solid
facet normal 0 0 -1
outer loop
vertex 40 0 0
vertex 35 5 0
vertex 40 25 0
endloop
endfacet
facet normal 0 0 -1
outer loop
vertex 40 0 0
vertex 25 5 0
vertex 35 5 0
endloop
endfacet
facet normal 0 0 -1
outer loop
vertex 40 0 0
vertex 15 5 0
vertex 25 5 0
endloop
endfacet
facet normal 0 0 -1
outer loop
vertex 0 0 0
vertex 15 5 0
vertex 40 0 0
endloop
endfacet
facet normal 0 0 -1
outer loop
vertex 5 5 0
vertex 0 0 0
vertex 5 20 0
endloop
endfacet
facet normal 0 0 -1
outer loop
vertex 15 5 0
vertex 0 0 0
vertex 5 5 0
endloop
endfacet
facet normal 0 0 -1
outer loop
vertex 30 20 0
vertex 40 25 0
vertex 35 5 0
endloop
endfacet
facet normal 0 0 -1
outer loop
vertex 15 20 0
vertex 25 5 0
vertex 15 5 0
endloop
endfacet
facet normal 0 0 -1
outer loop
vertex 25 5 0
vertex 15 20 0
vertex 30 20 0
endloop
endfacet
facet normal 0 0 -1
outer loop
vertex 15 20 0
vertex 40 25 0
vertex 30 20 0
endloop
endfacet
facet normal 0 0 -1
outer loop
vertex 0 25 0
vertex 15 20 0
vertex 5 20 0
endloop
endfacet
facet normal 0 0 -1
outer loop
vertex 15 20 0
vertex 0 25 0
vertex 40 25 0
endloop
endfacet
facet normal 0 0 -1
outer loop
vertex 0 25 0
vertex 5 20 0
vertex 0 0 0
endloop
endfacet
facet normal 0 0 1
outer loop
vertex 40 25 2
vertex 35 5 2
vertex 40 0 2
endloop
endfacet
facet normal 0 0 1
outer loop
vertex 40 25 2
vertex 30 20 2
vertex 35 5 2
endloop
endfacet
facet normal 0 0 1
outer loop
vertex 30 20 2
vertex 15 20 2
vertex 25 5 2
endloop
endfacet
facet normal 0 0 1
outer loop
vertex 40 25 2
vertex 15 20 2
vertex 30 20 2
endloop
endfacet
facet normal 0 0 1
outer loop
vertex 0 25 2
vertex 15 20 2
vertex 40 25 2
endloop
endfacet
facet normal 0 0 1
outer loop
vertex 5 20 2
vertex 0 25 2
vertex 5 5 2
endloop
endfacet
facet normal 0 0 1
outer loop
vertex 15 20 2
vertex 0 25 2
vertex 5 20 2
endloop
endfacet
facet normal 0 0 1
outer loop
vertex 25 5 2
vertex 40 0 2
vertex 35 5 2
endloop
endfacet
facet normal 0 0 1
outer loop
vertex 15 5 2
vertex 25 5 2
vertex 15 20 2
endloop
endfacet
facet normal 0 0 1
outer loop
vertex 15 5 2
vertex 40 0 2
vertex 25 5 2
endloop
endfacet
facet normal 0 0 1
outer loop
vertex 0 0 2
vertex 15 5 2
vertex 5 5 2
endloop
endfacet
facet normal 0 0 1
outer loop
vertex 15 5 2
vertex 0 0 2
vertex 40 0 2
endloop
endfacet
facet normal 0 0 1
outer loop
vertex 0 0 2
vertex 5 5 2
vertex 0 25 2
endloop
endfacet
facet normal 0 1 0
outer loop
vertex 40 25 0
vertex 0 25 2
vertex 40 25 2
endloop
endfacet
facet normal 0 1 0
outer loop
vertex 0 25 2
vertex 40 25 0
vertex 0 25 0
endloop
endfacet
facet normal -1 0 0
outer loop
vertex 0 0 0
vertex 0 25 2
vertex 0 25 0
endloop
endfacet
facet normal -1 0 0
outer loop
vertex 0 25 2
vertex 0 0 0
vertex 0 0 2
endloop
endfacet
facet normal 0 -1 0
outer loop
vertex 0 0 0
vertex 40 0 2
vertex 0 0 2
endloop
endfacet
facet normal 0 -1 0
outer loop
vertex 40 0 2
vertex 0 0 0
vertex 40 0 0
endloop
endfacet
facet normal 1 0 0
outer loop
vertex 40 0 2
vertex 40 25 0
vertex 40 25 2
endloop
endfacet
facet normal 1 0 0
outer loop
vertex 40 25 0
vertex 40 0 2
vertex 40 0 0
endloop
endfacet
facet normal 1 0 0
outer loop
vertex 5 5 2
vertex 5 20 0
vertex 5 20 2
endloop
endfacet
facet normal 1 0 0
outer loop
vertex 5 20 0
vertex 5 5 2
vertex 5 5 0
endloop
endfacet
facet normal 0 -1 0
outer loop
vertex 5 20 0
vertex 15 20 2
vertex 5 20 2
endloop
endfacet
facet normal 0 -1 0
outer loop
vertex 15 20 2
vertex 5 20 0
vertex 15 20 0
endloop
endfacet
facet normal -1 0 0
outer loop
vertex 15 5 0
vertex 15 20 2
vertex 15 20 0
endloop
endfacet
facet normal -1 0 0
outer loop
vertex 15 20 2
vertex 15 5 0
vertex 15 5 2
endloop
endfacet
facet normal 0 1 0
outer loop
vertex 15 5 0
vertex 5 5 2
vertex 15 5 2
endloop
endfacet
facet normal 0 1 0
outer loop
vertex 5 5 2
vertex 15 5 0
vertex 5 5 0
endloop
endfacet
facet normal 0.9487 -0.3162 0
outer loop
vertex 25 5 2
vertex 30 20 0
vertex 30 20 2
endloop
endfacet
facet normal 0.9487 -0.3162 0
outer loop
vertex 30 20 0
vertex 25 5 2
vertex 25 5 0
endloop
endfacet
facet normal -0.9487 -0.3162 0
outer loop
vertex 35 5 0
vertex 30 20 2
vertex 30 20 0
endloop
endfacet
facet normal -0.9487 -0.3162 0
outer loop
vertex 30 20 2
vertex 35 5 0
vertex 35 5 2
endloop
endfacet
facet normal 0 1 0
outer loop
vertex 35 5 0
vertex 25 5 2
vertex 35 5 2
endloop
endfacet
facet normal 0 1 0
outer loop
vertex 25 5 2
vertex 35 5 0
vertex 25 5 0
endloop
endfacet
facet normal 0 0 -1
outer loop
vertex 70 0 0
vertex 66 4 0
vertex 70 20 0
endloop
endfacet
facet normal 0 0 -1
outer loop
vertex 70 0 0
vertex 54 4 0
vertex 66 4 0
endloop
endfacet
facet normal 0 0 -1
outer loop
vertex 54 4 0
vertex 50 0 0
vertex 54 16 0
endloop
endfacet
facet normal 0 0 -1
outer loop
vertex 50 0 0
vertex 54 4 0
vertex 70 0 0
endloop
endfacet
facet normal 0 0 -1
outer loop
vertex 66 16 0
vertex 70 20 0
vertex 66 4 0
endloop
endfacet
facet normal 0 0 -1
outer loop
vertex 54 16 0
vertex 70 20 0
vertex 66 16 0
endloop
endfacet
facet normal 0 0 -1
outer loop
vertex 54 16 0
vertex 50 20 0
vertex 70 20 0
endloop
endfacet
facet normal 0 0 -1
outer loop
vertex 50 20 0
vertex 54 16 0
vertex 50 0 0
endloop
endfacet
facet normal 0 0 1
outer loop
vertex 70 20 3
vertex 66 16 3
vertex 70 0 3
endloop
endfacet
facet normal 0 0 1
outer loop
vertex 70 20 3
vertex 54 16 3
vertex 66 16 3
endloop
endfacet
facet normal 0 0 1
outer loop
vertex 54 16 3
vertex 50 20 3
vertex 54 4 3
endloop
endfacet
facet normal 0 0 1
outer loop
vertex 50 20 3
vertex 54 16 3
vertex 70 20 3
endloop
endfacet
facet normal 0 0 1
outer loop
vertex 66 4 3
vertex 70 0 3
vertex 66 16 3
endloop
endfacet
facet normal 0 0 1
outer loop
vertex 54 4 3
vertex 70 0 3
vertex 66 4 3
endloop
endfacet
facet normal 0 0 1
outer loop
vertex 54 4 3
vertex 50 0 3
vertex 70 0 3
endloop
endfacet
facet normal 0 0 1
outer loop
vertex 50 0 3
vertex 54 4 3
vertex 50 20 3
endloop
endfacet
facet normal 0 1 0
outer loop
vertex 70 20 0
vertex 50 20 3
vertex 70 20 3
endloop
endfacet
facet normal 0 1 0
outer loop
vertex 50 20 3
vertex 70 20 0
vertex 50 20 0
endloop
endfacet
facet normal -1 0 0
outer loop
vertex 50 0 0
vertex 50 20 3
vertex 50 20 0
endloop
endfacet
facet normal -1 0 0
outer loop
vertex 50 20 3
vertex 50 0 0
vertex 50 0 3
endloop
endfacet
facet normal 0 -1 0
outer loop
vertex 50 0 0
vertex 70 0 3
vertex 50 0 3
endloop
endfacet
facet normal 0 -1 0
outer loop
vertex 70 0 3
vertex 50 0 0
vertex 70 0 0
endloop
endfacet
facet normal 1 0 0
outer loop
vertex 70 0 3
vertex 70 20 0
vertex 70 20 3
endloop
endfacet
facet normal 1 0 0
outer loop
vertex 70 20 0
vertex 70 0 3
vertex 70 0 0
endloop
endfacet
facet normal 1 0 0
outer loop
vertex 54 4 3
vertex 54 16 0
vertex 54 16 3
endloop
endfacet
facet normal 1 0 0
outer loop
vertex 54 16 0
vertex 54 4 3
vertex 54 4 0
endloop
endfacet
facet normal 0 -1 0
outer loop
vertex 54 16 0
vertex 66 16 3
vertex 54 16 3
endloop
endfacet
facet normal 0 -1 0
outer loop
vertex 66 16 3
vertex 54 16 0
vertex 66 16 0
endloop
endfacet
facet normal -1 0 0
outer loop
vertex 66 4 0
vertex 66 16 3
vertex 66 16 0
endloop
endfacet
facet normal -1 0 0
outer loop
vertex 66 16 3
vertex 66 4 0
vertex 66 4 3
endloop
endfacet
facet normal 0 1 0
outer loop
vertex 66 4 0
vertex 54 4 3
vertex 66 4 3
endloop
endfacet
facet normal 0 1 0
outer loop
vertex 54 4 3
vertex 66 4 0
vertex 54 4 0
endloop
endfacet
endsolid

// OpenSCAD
// Purpose: polygon with holes via paths – perforated sheet/sign with two windows, extruded.
pts = [
    [0, 0], [40, 0], [40, 25], [0, 25],      // outside
    [5, 5], [15, 5], [15, 20], [5, 20],      // Window 1
    [25, 5], [35, 5], [30, 20]               // Window 2 (triangle)
];
linear_extrude(height = 2) polygon(points = pts, paths = [[0, 1, 2, 3], [4, 5, 6, 7], [8, 9, 10]]);
// Second part: frame of two paths without naming
translate([50, 0, 0]) linear_extrude(3)
    polygon([[0, 0], [20, 0], [20, 20], [0, 20], [4, 4], [16, 4], [16, 16], [4, 16]],
            [[0, 1, 2, 3], [4, 5, 6, 7]]);
